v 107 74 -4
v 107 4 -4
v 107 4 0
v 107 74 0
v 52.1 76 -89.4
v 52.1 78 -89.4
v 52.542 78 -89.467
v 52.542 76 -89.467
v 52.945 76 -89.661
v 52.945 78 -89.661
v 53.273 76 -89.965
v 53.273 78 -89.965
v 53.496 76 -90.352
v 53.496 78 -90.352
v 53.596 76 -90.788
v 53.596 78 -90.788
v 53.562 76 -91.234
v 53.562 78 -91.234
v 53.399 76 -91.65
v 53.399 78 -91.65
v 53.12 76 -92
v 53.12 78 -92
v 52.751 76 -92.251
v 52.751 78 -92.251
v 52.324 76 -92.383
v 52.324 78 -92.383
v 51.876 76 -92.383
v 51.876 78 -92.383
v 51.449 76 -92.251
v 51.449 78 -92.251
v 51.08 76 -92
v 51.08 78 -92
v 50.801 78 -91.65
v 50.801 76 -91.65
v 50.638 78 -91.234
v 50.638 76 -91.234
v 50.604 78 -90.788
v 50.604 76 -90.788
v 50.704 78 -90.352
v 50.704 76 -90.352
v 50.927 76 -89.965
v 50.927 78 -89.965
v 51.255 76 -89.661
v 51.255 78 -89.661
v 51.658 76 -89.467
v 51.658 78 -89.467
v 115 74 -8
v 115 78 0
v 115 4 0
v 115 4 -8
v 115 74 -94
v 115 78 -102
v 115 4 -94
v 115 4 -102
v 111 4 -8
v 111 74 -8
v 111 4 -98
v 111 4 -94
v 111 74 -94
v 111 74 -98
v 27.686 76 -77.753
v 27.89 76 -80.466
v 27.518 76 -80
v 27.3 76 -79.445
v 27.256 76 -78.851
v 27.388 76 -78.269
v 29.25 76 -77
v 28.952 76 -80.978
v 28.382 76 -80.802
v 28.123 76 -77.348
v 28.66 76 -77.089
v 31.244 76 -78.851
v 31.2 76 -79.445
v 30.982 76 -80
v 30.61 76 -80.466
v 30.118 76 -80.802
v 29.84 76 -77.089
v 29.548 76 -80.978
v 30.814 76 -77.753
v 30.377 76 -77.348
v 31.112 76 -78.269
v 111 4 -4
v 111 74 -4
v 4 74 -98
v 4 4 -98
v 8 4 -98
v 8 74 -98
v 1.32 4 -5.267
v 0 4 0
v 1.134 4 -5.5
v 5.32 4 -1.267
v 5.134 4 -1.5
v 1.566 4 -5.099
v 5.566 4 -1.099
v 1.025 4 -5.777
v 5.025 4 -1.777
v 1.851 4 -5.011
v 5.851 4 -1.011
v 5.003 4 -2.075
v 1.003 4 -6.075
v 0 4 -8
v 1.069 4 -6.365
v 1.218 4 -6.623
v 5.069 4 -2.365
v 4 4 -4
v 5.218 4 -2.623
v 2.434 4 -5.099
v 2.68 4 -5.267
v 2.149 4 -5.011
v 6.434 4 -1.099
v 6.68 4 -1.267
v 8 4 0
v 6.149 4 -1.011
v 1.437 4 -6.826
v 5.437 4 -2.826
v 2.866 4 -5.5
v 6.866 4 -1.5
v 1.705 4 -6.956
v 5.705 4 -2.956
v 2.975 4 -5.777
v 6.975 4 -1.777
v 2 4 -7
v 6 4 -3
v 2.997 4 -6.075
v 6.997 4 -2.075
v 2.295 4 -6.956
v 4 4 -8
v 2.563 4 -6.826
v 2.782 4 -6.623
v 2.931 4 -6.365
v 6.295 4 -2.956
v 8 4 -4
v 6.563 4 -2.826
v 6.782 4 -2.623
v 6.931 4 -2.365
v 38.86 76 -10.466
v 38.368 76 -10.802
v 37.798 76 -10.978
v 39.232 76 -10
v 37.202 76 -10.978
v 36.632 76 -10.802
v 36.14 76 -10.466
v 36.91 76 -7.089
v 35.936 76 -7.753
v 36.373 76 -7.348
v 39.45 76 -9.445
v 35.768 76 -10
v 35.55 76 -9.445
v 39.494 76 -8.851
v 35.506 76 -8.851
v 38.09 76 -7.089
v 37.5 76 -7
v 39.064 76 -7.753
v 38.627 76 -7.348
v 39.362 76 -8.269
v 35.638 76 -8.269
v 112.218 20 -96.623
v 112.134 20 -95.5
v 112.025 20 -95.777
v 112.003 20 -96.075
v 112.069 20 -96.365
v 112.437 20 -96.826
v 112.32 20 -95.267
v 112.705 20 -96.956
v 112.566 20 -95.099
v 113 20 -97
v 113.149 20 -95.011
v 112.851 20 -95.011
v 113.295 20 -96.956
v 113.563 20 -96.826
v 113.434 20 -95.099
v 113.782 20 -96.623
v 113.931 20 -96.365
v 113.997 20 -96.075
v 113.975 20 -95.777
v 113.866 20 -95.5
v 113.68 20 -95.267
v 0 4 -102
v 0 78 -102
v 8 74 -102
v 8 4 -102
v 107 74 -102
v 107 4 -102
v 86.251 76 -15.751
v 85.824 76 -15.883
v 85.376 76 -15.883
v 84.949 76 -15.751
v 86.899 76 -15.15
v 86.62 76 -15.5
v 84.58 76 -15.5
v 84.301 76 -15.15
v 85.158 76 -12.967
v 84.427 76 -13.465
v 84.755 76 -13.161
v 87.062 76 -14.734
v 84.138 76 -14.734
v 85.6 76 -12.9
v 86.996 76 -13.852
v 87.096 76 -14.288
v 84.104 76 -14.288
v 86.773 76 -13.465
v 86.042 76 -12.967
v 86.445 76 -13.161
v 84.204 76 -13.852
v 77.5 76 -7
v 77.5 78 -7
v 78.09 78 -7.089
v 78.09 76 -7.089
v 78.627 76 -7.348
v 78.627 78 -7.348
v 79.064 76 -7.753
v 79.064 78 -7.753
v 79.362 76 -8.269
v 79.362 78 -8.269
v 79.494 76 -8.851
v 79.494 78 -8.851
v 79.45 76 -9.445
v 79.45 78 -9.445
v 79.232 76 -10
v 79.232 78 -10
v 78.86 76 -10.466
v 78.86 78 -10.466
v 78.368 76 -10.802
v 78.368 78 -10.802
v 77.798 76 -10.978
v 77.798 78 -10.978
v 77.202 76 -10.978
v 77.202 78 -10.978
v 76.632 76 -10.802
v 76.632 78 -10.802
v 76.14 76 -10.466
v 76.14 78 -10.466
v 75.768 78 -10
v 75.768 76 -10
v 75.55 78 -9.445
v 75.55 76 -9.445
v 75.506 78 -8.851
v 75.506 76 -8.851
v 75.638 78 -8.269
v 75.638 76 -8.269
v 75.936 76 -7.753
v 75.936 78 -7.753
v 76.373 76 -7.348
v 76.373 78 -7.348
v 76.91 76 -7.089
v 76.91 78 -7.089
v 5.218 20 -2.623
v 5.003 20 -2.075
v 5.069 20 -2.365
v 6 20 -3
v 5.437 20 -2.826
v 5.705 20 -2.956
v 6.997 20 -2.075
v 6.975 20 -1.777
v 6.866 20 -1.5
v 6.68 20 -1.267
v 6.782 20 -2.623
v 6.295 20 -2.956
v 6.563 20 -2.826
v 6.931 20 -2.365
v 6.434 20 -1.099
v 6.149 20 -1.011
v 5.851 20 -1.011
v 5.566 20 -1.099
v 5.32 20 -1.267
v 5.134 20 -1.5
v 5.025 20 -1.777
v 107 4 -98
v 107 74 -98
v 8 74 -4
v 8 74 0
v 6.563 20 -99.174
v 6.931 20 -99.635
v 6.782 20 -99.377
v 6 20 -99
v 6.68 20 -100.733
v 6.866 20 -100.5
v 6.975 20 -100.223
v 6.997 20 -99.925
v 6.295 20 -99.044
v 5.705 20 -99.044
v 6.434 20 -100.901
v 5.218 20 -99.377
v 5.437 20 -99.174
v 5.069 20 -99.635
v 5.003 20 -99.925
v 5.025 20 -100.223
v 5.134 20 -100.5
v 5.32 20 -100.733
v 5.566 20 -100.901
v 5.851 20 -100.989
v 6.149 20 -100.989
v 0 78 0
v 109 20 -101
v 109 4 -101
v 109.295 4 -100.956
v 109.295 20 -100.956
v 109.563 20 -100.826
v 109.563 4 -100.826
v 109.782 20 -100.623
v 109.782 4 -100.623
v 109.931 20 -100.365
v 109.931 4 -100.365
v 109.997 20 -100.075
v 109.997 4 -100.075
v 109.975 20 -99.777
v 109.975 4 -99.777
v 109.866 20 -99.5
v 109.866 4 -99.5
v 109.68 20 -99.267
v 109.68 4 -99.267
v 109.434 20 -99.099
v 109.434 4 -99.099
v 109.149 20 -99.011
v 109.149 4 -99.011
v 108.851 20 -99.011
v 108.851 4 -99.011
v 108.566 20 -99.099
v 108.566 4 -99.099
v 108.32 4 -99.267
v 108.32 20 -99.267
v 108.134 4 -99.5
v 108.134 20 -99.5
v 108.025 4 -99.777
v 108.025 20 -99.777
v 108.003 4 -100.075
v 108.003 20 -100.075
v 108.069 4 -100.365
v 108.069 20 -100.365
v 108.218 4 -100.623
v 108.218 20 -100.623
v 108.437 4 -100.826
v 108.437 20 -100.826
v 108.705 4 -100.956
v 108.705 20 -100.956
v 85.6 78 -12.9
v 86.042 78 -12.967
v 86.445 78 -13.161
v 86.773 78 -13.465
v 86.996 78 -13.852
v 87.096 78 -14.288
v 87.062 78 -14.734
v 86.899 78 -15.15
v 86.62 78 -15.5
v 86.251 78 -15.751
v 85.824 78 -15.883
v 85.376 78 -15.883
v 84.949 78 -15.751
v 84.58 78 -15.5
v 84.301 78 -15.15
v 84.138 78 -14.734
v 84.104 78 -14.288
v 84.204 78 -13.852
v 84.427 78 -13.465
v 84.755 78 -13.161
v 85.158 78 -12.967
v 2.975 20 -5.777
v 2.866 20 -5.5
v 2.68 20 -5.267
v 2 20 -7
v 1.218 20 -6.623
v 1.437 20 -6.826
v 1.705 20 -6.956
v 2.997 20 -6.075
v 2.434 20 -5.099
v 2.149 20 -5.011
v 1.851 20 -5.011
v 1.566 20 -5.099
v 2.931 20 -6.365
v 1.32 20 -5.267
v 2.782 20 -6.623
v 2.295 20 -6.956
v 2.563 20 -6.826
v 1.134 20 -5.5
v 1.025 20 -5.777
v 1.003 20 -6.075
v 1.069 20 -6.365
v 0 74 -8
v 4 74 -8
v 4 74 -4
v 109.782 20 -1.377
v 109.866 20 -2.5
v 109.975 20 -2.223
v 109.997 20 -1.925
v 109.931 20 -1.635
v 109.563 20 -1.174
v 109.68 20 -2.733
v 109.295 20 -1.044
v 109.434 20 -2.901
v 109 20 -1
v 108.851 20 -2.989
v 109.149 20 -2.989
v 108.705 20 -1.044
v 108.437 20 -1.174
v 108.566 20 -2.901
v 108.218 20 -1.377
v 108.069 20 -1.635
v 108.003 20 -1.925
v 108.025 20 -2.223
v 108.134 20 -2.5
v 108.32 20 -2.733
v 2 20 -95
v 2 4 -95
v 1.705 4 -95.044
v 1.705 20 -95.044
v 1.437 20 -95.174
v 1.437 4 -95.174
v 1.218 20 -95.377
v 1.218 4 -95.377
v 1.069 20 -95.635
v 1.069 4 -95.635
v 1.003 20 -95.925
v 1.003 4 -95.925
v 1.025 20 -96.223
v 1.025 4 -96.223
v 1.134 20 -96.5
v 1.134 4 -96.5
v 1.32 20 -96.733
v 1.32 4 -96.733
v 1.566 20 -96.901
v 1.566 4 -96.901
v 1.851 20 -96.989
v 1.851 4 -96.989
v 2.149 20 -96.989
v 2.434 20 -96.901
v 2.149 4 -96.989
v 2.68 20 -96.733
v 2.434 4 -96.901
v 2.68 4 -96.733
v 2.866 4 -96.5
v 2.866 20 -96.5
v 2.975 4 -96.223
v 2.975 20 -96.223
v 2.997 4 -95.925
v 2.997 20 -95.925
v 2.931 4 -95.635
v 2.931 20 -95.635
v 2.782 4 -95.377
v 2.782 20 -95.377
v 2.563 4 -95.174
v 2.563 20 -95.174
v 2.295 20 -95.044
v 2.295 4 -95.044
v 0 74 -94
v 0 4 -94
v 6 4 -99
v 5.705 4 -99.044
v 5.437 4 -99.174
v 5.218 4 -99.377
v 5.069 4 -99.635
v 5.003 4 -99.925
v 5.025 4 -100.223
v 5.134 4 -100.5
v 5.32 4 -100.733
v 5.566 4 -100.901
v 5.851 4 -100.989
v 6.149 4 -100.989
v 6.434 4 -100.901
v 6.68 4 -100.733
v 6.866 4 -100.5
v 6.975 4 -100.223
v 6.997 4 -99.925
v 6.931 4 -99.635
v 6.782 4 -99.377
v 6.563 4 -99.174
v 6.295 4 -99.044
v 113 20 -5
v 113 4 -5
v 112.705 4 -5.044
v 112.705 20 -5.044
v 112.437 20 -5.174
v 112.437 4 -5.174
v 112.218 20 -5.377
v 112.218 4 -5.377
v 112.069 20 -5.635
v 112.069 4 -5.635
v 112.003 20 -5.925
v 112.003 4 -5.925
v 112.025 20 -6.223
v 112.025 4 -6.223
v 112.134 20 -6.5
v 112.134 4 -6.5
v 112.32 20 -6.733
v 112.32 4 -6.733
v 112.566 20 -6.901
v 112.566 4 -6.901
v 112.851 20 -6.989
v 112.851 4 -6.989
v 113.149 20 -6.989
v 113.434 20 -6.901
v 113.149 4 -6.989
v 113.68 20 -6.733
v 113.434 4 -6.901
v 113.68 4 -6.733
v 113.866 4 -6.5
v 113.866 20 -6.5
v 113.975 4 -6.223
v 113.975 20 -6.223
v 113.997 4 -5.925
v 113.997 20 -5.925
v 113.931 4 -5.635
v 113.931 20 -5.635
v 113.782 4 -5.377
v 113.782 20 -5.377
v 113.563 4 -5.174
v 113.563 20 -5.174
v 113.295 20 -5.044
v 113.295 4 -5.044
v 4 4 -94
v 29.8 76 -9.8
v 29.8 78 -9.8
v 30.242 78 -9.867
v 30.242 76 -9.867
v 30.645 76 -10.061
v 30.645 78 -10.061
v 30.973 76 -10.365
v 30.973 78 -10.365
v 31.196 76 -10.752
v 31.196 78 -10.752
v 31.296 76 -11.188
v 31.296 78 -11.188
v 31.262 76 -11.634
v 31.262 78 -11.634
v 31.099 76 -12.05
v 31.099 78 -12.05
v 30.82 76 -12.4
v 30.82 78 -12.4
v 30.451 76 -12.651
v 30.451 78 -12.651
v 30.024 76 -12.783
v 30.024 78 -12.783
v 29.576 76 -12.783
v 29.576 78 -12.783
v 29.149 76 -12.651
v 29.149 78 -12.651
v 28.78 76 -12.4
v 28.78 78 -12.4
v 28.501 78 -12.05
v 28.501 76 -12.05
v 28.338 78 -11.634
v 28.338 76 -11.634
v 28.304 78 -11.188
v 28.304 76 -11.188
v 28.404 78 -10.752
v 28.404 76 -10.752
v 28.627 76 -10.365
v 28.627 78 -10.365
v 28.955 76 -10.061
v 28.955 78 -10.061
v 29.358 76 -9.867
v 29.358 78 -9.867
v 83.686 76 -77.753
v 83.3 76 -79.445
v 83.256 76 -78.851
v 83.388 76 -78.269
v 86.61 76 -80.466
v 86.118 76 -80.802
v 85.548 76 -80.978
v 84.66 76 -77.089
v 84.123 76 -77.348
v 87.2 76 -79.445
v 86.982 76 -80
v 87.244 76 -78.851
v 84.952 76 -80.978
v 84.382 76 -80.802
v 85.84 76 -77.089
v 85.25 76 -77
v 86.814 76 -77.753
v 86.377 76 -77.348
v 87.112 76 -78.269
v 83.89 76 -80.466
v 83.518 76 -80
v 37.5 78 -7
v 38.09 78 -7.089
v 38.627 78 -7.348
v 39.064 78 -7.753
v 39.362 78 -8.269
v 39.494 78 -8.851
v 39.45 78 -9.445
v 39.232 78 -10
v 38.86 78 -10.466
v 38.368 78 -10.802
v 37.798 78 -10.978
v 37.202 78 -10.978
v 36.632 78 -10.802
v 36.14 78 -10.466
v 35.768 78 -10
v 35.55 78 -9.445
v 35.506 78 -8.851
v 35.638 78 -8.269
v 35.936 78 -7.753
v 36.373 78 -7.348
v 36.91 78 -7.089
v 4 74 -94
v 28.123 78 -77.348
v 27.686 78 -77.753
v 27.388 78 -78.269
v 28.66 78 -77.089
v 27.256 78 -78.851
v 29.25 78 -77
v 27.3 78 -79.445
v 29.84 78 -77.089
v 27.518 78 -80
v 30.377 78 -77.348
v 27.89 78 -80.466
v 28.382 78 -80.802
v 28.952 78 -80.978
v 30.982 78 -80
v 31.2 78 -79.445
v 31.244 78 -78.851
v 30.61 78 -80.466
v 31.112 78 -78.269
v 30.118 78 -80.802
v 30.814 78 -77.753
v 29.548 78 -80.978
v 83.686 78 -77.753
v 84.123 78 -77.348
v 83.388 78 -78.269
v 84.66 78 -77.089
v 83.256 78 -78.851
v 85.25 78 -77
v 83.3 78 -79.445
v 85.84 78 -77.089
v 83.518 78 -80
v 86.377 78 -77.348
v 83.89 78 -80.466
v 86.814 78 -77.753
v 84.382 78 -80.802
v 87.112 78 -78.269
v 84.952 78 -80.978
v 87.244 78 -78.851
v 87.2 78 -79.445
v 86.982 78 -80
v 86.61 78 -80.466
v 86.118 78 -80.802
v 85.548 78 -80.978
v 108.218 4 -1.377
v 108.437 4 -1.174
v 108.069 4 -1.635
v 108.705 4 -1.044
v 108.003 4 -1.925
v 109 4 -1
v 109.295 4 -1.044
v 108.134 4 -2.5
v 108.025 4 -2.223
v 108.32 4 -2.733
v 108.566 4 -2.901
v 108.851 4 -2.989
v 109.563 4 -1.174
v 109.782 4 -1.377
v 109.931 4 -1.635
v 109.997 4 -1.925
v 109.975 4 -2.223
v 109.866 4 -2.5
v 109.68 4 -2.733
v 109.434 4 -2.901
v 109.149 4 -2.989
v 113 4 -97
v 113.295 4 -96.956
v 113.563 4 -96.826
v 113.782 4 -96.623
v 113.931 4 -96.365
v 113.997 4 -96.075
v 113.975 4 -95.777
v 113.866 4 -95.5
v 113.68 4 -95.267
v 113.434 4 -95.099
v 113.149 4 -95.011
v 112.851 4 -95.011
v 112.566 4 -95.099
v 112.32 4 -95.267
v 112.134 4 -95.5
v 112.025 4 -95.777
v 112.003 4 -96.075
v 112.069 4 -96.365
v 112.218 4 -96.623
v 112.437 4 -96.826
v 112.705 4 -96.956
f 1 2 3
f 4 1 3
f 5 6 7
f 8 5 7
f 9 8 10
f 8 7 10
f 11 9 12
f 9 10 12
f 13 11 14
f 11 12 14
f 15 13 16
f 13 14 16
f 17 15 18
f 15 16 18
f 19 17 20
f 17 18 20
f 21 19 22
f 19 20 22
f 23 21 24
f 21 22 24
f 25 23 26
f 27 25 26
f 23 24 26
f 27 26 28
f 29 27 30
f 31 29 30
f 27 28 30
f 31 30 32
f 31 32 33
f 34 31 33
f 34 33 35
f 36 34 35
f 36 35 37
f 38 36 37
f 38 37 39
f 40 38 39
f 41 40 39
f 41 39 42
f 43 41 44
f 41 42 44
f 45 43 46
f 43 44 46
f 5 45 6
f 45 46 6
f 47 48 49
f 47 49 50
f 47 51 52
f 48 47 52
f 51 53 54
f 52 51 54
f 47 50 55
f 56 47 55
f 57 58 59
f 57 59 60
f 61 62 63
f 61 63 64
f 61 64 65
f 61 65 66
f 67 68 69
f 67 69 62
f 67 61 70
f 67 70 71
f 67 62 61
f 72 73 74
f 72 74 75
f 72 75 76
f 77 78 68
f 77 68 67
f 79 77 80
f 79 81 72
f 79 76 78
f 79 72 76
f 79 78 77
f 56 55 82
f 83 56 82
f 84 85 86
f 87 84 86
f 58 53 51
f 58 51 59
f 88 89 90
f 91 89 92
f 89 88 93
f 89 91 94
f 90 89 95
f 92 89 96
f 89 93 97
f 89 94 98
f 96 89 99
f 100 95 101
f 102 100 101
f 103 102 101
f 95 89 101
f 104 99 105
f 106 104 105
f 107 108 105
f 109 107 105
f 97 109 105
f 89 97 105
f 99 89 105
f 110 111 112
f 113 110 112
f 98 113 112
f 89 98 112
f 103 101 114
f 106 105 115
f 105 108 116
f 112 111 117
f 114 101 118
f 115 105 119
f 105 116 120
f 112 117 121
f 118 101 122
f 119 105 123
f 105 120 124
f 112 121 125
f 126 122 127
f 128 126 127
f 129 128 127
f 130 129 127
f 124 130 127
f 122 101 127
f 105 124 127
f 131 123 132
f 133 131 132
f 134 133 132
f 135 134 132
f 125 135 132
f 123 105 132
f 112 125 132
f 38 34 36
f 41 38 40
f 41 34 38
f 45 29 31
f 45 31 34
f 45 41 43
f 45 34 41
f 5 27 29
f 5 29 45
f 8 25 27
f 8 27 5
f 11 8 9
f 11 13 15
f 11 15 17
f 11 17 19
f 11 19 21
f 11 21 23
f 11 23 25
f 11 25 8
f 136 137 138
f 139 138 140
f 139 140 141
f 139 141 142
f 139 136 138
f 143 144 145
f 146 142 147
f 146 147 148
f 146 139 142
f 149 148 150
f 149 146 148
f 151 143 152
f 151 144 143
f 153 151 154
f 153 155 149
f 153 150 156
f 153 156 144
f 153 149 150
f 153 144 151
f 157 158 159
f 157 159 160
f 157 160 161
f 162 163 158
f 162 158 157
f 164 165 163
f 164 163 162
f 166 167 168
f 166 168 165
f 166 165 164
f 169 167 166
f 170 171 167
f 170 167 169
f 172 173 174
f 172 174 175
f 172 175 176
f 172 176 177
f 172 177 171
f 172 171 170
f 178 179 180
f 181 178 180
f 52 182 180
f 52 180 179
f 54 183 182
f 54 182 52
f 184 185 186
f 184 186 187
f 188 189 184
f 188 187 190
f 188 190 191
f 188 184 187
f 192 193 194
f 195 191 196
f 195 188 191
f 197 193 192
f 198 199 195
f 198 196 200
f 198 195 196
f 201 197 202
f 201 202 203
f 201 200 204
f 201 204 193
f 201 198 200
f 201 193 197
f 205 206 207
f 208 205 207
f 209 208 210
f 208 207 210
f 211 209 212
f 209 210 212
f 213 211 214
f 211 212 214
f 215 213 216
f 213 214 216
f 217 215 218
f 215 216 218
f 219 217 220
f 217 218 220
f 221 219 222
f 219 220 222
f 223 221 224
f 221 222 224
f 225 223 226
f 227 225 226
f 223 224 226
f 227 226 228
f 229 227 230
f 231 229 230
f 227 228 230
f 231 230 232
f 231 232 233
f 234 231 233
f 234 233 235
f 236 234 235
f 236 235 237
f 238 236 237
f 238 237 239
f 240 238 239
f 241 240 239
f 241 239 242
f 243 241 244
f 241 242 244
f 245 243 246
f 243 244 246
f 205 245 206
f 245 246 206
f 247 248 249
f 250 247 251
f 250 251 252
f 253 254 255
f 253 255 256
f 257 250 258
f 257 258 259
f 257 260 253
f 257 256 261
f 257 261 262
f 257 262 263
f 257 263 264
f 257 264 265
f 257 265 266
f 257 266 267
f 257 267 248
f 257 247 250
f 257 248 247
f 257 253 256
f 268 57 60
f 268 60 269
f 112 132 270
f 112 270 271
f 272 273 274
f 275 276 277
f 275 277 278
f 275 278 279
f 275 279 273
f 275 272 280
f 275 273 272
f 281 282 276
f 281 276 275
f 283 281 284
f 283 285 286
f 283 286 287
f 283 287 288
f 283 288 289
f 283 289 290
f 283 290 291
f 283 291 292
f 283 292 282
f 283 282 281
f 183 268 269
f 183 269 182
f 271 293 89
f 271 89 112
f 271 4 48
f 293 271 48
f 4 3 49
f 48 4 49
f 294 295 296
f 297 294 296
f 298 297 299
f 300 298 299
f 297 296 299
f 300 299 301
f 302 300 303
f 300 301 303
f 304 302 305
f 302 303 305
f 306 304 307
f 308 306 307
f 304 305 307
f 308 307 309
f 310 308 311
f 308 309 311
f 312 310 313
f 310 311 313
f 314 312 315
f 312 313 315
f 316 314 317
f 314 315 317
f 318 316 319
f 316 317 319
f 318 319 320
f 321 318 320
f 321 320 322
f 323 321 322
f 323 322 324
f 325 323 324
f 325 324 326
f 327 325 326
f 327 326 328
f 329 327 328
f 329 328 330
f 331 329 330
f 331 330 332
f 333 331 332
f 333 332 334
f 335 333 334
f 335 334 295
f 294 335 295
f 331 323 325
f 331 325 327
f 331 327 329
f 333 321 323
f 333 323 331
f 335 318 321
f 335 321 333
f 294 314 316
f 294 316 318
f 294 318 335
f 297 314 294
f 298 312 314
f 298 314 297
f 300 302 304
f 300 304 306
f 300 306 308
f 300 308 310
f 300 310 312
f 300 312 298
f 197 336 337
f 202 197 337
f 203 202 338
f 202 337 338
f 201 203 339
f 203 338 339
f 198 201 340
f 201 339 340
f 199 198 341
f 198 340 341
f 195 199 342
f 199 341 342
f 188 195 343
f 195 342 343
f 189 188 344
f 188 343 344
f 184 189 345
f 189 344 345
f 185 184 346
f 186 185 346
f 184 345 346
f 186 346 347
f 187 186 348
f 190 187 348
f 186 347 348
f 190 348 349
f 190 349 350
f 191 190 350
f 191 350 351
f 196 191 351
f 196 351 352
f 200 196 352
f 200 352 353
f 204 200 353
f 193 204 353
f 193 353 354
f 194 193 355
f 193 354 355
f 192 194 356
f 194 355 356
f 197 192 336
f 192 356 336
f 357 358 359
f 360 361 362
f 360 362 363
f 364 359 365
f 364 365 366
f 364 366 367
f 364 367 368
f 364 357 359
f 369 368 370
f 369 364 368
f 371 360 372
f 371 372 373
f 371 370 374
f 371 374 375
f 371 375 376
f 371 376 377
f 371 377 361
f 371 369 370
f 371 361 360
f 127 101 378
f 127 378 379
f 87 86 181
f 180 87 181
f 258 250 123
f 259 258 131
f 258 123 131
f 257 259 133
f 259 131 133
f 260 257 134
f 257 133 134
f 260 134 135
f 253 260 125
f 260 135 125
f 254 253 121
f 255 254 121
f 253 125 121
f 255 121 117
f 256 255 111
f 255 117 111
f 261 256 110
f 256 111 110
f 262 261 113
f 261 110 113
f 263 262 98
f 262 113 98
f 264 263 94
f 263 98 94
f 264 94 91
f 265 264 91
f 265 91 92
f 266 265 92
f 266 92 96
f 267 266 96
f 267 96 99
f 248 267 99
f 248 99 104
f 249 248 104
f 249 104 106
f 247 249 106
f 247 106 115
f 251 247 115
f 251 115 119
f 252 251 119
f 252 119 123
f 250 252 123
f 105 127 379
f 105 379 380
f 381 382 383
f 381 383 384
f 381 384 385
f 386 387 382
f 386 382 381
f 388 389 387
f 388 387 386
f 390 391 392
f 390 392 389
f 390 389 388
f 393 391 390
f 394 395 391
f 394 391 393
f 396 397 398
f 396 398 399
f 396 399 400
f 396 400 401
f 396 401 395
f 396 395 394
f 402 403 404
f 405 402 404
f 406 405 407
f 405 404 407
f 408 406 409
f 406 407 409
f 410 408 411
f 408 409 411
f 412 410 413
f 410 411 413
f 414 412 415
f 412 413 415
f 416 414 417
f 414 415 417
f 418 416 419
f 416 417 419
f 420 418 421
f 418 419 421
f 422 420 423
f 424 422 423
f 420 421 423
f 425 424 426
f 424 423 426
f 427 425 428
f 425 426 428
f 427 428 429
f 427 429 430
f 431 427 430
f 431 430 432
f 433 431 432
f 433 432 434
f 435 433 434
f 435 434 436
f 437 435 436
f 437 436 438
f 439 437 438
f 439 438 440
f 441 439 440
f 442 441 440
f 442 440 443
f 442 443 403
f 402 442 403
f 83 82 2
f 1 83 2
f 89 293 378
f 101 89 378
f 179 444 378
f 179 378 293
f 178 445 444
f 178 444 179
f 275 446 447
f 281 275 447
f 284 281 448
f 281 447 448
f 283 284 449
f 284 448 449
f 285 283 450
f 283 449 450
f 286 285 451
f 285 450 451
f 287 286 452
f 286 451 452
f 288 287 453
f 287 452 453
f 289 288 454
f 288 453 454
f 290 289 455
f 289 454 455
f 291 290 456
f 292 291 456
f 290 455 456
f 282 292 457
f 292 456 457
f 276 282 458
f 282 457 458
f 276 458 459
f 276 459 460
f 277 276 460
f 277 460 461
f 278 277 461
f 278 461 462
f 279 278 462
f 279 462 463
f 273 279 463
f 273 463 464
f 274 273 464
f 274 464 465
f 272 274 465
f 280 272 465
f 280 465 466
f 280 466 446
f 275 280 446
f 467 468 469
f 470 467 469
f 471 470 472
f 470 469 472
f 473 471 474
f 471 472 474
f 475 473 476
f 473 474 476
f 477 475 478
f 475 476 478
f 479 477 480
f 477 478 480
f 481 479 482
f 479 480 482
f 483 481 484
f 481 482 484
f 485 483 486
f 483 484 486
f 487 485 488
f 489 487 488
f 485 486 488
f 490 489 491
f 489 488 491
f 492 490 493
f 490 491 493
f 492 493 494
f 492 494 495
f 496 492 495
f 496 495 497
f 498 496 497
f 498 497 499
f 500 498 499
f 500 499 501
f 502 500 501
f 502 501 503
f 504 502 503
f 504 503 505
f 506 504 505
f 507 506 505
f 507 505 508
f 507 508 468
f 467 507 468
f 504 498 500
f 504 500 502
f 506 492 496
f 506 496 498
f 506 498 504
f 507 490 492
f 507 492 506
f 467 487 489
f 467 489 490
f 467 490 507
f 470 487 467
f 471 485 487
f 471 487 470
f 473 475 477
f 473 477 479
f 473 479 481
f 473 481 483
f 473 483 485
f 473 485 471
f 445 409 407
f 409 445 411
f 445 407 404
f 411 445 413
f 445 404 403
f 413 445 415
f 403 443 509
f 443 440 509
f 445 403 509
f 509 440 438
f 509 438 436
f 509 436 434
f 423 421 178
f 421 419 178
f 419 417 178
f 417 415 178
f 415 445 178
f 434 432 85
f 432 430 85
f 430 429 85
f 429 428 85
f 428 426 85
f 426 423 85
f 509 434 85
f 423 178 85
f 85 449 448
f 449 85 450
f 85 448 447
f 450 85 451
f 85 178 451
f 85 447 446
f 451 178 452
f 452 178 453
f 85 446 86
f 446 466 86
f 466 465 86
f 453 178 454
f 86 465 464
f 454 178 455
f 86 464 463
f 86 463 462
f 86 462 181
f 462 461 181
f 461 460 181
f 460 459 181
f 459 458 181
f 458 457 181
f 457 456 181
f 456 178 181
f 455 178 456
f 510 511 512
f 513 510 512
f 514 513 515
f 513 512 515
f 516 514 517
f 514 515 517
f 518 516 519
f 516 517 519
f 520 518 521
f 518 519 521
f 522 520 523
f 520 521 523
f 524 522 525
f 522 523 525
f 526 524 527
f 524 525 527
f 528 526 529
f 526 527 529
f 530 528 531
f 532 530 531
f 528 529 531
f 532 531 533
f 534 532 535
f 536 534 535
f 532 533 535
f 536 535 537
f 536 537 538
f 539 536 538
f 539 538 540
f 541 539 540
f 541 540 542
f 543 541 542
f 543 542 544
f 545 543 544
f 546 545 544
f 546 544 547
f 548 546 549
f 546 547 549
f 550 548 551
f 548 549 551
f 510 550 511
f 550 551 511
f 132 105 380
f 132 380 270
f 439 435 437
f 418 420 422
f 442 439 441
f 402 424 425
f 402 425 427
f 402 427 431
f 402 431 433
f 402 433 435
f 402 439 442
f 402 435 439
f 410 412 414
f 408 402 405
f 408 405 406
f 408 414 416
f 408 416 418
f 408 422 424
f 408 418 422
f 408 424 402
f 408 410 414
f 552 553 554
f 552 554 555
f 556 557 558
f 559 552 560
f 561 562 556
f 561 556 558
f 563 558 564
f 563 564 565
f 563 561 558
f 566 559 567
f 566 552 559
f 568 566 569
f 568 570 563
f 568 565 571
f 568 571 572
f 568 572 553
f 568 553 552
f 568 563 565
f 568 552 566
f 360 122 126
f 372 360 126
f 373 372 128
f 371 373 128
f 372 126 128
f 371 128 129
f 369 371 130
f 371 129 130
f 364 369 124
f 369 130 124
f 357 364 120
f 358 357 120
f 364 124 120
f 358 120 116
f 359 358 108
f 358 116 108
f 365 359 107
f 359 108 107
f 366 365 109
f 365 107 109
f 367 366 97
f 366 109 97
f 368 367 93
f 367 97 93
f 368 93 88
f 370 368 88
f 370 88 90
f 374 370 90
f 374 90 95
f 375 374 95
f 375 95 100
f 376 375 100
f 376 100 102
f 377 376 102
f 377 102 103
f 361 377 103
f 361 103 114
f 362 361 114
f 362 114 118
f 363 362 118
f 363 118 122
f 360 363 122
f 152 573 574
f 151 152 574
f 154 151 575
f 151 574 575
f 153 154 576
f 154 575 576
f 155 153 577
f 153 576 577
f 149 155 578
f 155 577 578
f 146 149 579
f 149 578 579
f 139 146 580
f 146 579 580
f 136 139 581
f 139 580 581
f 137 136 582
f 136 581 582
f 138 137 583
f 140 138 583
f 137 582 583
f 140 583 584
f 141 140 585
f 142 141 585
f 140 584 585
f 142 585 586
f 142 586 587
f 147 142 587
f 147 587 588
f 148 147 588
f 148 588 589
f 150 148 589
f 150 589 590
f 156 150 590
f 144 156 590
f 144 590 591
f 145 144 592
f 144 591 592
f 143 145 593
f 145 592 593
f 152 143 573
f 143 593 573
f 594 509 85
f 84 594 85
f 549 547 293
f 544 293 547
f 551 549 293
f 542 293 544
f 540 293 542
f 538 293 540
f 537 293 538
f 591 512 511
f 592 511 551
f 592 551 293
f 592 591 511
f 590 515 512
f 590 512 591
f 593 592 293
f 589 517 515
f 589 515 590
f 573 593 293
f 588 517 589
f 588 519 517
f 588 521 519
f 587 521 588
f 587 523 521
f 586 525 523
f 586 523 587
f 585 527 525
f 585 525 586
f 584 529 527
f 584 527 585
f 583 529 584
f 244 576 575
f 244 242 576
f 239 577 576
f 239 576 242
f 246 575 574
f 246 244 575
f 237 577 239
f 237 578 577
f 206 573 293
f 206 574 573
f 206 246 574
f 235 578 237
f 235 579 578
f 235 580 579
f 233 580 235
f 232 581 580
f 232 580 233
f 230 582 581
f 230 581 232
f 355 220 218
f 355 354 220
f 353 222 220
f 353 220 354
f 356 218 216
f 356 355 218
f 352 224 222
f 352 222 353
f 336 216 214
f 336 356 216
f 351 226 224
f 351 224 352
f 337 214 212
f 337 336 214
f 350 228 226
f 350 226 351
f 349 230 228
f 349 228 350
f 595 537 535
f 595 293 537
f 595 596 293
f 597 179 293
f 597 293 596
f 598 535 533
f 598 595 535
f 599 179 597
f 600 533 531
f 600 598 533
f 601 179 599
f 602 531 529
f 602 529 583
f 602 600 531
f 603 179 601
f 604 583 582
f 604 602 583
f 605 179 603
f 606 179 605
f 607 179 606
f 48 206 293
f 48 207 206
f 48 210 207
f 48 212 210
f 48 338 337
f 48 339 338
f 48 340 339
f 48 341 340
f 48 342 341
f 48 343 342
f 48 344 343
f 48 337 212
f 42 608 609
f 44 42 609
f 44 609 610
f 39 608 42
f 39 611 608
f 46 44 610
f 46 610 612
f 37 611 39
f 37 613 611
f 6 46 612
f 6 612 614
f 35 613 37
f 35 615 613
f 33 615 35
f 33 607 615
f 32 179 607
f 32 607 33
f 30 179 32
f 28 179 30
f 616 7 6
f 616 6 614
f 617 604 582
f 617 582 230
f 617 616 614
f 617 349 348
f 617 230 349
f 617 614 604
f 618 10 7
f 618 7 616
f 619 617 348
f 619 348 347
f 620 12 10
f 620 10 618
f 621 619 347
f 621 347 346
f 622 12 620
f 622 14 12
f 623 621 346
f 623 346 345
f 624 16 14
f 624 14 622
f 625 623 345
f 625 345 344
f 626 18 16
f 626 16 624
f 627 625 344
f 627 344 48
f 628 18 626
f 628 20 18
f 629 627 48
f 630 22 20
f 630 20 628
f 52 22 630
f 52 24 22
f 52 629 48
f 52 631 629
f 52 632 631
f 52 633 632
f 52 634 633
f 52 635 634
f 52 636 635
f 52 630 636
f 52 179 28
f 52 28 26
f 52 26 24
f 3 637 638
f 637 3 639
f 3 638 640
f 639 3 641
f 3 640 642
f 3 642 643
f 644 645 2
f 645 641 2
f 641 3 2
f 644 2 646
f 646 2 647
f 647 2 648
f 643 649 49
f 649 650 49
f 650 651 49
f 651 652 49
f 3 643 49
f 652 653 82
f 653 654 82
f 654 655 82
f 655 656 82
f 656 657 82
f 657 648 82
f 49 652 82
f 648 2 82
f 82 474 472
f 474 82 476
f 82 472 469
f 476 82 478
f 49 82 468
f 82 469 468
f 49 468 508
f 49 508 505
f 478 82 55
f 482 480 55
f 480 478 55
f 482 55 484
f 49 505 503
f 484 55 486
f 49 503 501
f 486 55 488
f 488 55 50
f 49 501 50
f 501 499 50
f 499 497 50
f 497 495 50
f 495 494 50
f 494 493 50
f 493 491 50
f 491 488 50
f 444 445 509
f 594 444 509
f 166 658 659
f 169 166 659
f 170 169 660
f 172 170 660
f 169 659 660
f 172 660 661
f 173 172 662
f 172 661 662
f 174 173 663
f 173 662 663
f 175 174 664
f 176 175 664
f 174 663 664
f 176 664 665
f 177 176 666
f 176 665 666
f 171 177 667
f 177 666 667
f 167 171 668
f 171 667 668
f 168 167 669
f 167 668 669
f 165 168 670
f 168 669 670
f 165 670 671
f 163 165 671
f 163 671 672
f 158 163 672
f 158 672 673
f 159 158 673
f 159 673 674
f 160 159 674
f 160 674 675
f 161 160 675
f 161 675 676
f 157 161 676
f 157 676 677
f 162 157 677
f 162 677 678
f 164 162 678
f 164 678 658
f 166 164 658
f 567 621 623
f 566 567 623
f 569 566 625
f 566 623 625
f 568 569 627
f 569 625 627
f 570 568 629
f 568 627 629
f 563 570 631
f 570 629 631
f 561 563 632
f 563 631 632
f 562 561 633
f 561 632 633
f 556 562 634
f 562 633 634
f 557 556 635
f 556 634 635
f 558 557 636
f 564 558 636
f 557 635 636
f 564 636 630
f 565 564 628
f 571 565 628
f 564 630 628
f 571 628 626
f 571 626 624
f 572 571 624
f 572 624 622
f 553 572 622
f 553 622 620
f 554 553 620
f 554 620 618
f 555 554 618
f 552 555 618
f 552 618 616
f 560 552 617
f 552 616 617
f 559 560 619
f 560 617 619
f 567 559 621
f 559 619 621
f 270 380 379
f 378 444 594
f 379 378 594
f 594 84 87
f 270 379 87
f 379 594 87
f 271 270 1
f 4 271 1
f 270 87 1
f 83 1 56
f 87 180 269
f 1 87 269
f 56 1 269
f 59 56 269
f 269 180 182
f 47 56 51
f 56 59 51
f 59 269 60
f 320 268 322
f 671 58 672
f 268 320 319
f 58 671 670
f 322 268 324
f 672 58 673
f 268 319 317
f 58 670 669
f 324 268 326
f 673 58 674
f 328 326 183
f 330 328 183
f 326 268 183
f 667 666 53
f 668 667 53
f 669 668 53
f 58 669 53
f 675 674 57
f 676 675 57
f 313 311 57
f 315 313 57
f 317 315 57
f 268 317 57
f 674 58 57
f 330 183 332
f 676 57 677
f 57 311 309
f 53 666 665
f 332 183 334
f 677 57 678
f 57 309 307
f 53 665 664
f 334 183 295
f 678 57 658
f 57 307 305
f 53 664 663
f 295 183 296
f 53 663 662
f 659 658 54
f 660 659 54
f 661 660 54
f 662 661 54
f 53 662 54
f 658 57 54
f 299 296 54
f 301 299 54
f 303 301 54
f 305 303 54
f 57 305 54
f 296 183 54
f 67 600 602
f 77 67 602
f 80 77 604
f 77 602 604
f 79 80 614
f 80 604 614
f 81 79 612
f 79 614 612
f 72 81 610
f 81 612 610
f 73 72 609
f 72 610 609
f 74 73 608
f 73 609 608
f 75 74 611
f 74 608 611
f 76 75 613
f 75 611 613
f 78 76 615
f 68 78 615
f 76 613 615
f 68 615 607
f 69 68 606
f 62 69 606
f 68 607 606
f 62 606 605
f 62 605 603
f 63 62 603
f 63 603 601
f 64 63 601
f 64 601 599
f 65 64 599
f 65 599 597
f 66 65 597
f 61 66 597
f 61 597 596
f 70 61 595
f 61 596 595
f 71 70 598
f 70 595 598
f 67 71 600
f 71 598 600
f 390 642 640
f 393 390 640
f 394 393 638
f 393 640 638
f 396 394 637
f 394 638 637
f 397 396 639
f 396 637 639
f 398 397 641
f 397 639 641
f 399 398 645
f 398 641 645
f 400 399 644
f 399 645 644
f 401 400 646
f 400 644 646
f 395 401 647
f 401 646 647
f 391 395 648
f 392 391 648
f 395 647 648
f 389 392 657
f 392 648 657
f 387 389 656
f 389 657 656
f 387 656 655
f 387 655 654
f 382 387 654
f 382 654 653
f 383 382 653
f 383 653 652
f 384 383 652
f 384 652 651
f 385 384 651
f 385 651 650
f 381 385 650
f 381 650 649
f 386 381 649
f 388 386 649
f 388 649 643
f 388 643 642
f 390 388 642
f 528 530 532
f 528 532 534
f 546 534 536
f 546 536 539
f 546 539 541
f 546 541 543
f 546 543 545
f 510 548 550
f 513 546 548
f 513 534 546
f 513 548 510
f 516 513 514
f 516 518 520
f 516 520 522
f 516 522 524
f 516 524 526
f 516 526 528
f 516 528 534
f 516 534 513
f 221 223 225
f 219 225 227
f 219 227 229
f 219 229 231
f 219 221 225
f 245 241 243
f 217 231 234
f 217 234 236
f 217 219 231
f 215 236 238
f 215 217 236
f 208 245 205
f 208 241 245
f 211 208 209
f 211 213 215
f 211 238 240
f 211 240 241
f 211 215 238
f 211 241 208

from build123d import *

# Parameters (mm, degrees)
SKETCH1_W           = 115
SKETCH1_H           = 102
BOSS_EXTRUDE1_DEPTH = 4
SKETCH3_W           = 15
SKETCH3_H           = 90
BOSS_EXTRUDE2_DEPTH = 40
SKETCH4_R           = 2.125
CUT_EXTRUDE4_DEPTH  = 10
SKETCH11_W          = 104
SKETCH11_H          = 91
CUT_EXTRUDE5_DEPTH  = 2
SKETCH14_R          = 1
CUT_EXTRUDE7_DEPTH  = 20
BOSS_EXTRUDE4_DEPTH = 70
SKETCH13_R          = 1
CUT_EXTRUDE6_DEPTH  = 20
SKETCH7_W           = 115
SKETCH7_H           = 102
BOSS_EXTRUDE5_DEPTH = 4
SKETCH8_R           = 2
CUT_EXTRUDE2_DEPTH  = 2
SKETCH9_R           = 1.5
CUT_EXTRUDE3_DEPTH  = 2
SKETCH15_W          = 168.231856539
SKETCH15_H          = 129.587124708
CUT_EXTRUDE8_DEPTH  = 171.601875722


with BuildPart() as part:
    # Sketch1 → Boss-Extrude1 (new body)
    with BuildSketch(Plane(origin=(0, 0, 0), x_dir=(1, 0, 0), z_dir=(0, 1, 0))):
        with Locations((57.5, 51)):
            Rectangle(SKETCH1_W, SKETCH1_H)
    extrude(amount=BOSS_EXTRUDE1_DEPTH)

    # Sketch3 → Boss-Extrude2 (add)
    with BuildSketch(Plane.XZ):
        with Locations((13, -51)):
            Rectangle(SKETCH3_W, SKETCH3_H)
        with Locations((102, -51)):
            Rectangle(SKETCH3_W, SKETCH3_H)
    extrude(amount=BOSS_EXTRUDE2_DEPTH)

    # Sketch4 → Cut-Extrude4 (cut)
    with BuildSketch(Plane.XZ.offset(40)):
        with Locations(Location((14.525, -67.125, 0), (0, 0, 270))):
            Circle(SKETCH4_R)
        with Locations(Location((14.525, -34.875, 0), (0, 0, 270))):
            Circle(SKETCH4_R)
        with Locations(Location((100.475, -67.125, 0), (0, 0, 270))):
            Circle(SKETCH4_R)
        with Locations(Location((100.475, -34.875, 0), (0, 0, 270))):
            Circle(SKETCH4_R)
    extrude(amount=-CUT_EXTRUDE4_DEPTH, mode=Mode.SUBTRACT)

    # Sketch11 → Cut-Extrude5 (cut)
    with BuildSketch(Plane(origin=(0, 4, 0), x_dir=(1, 0, 0), z_dir=(0, 1, 0))):
        with Locations((57.5, 51)):
            Rectangle(SKETCH11_W, SKETCH11_H)
    extrude(amount=-CUT_EXTRUDE5_DEPTH, mode=Mode.SUBTRACT)

    # Sketch14 → Cut-Extrude7 (cut)
    with BuildSketch(Plane.XZ):
        with Locations(Location((109, -100, 0), (0, 0, 270))):
            Circle(SKETCH14_R)
        with Locations(Location((113, -96, 0), (0, 0, 270))):
            Circle(SKETCH14_R)
        with Locations(Location((2, -96, 0), (0, 0, 270))):
            Circle(SKETCH14_R)
        with Locations(Location((6, -100, 0), (0, 0, 270))):
            Circle(SKETCH14_R)
        with Locations(Location((113, -6, 0), (0, 0, 270))):
            Circle(SKETCH14_R)
        with Locations(Location((109, -2, 0), (0, 0, 270))):
            Circle(SKETCH14_R)
        with Locations(Location((2, -6, 0), (0, 0, 270))):
            Circle(SKETCH14_R)
        with Locations(Location((6, -2, 0), (0, 0, 270))):
            Circle(SKETCH14_R)
    extrude(amount=-CUT_EXTRUDE7_DEPTH, mode=Mode.SUBTRACT)

    # Sketch6 → Boss-Extrude4 (add)
    with BuildSketch(Plane(origin=(0, 4, 0), x_dir=(1, 0, 0), z_dir=(0, 1, 0))):
        Polygon((0, 0), (0, 8), (4, 8), (4, 4), (8, 4), (8, 0), align=None)
        Polygon((107, 0), (115, 0), (115, 8), (111, 8), (111, 4), (107, 4), align=None)
        Polygon((107, 102), (115, 102), (115, 94), (111, 94), (111, 98), (107, 98), align=None)
        Polygon((8, 102), (0, 102), (0, 94), (4, 94), (4, 98), (8, 98), align=None)
    extrude(amount=BOSS_EXTRUDE4_DEPTH)

    # Sketch13 → Cut-Extrude6 (cut)
    with BuildSketch(Plane.XZ):
        with Locations(Location((109, -100, 0), (0, 0, 270))):
            Circle(SKETCH13_R)
        with Locations(Location((113, -96, 0), (0, 0, 270))):
            Circle(SKETCH13_R)
        with Locations(Location((2, -96, 0), (0, 0, 90))):
            Circle(SKETCH13_R)
        with Locations(Location((6, -100, 0), (0, 0, 90))):
            Circle(SKETCH13_R)
        with Locations(Location((113, -6, 0), (0, 0, 90))):
            Circle(SKETCH13_R)
        with Locations(Location((109, -2, 0), (0, 0, 90))):
            Circle(SKETCH13_R)
        with Locations(Location((6, -2, 0), (0, 0, 270))):
            Circle(SKETCH13_R)
        with Locations(Location((2, -6, 0), (0, 0, 270))):
            Circle(SKETCH13_R)
    extrude(amount=-CUT_EXTRUDE6_DEPTH, mode=Mode.SUBTRACT)

    # Sketch7 → Boss-Extrude5 (add)
    with BuildSketch(Plane(origin=(0, 74, 0), x_dir=(1, 0, 0), z_dir=(0, 1, 0))):
        with Locations((57.5, 51)):
            Rectangle(SKETCH7_W, SKETCH7_H)
    extrude(amount=BOSS_EXTRUDE5_DEPTH)

    # Sketch8 → Cut-Extrude2 (cut)
    with BuildSketch(Plane(origin=(0, 78, 0), x_dir=(1, 0, 0), z_dir=(0, 1, 0))):
        with Locations(Location((29.25, 79, 0), (0, 0, 270))):
            Circle(SKETCH8_R)
        with Locations(Location((85.25, 79, 0), (0, 0, 270))):
            Circle(SKETCH8_R)
        with Locations(Location((37.5, 9, 0), (0, 0, 270))):
            Circle(SKETCH8_R)
        with Locations(Location((77.5, 9, 0), (0, 0, 270))):
            Circle(SKETCH8_R)
    extrude(amount=-CUT_EXTRUDE2_DEPTH, mode=Mode.SUBTRACT)

    # Sketch9 → Cut-Extrude3 (cut)
    with BuildSketch(Plane(origin=(0, 78, 0), x_dir=(1, 0, 0), z_dir=(0, 1, 0))):
        with Locations(Location((52.1, 90.9, 0), (0, 0, 270))):
            Circle(SKETCH9_R)
        with Locations(Location((85.6, 14.4, 0), (0, 0, 270))):
            Circle(SKETCH9_R)
        with Locations(Location((29.8, 11.3, 0), (0, 0, 270))):
            Circle(SKETCH9_R)
    extrude(amount=-CUT_EXTRUDE3_DEPTH, mode=Mode.SUBTRACT)

    # Sketch15 → Cut-Extrude8 (cut, through all)
    with BuildSketch(Plane(origin=(0, 4, 0), x_dir=(1, 0, 0), z_dir=(0, 1, 0))):
        with Locations((71.077613374, 52.272730689)):
            Rectangle(SKETCH15_W, SKETCH15_H)
    extrude(amount=-CUT_EXTRUDE8_DEPTH, mode=Mode.SUBTRACT)


solid = part.part
